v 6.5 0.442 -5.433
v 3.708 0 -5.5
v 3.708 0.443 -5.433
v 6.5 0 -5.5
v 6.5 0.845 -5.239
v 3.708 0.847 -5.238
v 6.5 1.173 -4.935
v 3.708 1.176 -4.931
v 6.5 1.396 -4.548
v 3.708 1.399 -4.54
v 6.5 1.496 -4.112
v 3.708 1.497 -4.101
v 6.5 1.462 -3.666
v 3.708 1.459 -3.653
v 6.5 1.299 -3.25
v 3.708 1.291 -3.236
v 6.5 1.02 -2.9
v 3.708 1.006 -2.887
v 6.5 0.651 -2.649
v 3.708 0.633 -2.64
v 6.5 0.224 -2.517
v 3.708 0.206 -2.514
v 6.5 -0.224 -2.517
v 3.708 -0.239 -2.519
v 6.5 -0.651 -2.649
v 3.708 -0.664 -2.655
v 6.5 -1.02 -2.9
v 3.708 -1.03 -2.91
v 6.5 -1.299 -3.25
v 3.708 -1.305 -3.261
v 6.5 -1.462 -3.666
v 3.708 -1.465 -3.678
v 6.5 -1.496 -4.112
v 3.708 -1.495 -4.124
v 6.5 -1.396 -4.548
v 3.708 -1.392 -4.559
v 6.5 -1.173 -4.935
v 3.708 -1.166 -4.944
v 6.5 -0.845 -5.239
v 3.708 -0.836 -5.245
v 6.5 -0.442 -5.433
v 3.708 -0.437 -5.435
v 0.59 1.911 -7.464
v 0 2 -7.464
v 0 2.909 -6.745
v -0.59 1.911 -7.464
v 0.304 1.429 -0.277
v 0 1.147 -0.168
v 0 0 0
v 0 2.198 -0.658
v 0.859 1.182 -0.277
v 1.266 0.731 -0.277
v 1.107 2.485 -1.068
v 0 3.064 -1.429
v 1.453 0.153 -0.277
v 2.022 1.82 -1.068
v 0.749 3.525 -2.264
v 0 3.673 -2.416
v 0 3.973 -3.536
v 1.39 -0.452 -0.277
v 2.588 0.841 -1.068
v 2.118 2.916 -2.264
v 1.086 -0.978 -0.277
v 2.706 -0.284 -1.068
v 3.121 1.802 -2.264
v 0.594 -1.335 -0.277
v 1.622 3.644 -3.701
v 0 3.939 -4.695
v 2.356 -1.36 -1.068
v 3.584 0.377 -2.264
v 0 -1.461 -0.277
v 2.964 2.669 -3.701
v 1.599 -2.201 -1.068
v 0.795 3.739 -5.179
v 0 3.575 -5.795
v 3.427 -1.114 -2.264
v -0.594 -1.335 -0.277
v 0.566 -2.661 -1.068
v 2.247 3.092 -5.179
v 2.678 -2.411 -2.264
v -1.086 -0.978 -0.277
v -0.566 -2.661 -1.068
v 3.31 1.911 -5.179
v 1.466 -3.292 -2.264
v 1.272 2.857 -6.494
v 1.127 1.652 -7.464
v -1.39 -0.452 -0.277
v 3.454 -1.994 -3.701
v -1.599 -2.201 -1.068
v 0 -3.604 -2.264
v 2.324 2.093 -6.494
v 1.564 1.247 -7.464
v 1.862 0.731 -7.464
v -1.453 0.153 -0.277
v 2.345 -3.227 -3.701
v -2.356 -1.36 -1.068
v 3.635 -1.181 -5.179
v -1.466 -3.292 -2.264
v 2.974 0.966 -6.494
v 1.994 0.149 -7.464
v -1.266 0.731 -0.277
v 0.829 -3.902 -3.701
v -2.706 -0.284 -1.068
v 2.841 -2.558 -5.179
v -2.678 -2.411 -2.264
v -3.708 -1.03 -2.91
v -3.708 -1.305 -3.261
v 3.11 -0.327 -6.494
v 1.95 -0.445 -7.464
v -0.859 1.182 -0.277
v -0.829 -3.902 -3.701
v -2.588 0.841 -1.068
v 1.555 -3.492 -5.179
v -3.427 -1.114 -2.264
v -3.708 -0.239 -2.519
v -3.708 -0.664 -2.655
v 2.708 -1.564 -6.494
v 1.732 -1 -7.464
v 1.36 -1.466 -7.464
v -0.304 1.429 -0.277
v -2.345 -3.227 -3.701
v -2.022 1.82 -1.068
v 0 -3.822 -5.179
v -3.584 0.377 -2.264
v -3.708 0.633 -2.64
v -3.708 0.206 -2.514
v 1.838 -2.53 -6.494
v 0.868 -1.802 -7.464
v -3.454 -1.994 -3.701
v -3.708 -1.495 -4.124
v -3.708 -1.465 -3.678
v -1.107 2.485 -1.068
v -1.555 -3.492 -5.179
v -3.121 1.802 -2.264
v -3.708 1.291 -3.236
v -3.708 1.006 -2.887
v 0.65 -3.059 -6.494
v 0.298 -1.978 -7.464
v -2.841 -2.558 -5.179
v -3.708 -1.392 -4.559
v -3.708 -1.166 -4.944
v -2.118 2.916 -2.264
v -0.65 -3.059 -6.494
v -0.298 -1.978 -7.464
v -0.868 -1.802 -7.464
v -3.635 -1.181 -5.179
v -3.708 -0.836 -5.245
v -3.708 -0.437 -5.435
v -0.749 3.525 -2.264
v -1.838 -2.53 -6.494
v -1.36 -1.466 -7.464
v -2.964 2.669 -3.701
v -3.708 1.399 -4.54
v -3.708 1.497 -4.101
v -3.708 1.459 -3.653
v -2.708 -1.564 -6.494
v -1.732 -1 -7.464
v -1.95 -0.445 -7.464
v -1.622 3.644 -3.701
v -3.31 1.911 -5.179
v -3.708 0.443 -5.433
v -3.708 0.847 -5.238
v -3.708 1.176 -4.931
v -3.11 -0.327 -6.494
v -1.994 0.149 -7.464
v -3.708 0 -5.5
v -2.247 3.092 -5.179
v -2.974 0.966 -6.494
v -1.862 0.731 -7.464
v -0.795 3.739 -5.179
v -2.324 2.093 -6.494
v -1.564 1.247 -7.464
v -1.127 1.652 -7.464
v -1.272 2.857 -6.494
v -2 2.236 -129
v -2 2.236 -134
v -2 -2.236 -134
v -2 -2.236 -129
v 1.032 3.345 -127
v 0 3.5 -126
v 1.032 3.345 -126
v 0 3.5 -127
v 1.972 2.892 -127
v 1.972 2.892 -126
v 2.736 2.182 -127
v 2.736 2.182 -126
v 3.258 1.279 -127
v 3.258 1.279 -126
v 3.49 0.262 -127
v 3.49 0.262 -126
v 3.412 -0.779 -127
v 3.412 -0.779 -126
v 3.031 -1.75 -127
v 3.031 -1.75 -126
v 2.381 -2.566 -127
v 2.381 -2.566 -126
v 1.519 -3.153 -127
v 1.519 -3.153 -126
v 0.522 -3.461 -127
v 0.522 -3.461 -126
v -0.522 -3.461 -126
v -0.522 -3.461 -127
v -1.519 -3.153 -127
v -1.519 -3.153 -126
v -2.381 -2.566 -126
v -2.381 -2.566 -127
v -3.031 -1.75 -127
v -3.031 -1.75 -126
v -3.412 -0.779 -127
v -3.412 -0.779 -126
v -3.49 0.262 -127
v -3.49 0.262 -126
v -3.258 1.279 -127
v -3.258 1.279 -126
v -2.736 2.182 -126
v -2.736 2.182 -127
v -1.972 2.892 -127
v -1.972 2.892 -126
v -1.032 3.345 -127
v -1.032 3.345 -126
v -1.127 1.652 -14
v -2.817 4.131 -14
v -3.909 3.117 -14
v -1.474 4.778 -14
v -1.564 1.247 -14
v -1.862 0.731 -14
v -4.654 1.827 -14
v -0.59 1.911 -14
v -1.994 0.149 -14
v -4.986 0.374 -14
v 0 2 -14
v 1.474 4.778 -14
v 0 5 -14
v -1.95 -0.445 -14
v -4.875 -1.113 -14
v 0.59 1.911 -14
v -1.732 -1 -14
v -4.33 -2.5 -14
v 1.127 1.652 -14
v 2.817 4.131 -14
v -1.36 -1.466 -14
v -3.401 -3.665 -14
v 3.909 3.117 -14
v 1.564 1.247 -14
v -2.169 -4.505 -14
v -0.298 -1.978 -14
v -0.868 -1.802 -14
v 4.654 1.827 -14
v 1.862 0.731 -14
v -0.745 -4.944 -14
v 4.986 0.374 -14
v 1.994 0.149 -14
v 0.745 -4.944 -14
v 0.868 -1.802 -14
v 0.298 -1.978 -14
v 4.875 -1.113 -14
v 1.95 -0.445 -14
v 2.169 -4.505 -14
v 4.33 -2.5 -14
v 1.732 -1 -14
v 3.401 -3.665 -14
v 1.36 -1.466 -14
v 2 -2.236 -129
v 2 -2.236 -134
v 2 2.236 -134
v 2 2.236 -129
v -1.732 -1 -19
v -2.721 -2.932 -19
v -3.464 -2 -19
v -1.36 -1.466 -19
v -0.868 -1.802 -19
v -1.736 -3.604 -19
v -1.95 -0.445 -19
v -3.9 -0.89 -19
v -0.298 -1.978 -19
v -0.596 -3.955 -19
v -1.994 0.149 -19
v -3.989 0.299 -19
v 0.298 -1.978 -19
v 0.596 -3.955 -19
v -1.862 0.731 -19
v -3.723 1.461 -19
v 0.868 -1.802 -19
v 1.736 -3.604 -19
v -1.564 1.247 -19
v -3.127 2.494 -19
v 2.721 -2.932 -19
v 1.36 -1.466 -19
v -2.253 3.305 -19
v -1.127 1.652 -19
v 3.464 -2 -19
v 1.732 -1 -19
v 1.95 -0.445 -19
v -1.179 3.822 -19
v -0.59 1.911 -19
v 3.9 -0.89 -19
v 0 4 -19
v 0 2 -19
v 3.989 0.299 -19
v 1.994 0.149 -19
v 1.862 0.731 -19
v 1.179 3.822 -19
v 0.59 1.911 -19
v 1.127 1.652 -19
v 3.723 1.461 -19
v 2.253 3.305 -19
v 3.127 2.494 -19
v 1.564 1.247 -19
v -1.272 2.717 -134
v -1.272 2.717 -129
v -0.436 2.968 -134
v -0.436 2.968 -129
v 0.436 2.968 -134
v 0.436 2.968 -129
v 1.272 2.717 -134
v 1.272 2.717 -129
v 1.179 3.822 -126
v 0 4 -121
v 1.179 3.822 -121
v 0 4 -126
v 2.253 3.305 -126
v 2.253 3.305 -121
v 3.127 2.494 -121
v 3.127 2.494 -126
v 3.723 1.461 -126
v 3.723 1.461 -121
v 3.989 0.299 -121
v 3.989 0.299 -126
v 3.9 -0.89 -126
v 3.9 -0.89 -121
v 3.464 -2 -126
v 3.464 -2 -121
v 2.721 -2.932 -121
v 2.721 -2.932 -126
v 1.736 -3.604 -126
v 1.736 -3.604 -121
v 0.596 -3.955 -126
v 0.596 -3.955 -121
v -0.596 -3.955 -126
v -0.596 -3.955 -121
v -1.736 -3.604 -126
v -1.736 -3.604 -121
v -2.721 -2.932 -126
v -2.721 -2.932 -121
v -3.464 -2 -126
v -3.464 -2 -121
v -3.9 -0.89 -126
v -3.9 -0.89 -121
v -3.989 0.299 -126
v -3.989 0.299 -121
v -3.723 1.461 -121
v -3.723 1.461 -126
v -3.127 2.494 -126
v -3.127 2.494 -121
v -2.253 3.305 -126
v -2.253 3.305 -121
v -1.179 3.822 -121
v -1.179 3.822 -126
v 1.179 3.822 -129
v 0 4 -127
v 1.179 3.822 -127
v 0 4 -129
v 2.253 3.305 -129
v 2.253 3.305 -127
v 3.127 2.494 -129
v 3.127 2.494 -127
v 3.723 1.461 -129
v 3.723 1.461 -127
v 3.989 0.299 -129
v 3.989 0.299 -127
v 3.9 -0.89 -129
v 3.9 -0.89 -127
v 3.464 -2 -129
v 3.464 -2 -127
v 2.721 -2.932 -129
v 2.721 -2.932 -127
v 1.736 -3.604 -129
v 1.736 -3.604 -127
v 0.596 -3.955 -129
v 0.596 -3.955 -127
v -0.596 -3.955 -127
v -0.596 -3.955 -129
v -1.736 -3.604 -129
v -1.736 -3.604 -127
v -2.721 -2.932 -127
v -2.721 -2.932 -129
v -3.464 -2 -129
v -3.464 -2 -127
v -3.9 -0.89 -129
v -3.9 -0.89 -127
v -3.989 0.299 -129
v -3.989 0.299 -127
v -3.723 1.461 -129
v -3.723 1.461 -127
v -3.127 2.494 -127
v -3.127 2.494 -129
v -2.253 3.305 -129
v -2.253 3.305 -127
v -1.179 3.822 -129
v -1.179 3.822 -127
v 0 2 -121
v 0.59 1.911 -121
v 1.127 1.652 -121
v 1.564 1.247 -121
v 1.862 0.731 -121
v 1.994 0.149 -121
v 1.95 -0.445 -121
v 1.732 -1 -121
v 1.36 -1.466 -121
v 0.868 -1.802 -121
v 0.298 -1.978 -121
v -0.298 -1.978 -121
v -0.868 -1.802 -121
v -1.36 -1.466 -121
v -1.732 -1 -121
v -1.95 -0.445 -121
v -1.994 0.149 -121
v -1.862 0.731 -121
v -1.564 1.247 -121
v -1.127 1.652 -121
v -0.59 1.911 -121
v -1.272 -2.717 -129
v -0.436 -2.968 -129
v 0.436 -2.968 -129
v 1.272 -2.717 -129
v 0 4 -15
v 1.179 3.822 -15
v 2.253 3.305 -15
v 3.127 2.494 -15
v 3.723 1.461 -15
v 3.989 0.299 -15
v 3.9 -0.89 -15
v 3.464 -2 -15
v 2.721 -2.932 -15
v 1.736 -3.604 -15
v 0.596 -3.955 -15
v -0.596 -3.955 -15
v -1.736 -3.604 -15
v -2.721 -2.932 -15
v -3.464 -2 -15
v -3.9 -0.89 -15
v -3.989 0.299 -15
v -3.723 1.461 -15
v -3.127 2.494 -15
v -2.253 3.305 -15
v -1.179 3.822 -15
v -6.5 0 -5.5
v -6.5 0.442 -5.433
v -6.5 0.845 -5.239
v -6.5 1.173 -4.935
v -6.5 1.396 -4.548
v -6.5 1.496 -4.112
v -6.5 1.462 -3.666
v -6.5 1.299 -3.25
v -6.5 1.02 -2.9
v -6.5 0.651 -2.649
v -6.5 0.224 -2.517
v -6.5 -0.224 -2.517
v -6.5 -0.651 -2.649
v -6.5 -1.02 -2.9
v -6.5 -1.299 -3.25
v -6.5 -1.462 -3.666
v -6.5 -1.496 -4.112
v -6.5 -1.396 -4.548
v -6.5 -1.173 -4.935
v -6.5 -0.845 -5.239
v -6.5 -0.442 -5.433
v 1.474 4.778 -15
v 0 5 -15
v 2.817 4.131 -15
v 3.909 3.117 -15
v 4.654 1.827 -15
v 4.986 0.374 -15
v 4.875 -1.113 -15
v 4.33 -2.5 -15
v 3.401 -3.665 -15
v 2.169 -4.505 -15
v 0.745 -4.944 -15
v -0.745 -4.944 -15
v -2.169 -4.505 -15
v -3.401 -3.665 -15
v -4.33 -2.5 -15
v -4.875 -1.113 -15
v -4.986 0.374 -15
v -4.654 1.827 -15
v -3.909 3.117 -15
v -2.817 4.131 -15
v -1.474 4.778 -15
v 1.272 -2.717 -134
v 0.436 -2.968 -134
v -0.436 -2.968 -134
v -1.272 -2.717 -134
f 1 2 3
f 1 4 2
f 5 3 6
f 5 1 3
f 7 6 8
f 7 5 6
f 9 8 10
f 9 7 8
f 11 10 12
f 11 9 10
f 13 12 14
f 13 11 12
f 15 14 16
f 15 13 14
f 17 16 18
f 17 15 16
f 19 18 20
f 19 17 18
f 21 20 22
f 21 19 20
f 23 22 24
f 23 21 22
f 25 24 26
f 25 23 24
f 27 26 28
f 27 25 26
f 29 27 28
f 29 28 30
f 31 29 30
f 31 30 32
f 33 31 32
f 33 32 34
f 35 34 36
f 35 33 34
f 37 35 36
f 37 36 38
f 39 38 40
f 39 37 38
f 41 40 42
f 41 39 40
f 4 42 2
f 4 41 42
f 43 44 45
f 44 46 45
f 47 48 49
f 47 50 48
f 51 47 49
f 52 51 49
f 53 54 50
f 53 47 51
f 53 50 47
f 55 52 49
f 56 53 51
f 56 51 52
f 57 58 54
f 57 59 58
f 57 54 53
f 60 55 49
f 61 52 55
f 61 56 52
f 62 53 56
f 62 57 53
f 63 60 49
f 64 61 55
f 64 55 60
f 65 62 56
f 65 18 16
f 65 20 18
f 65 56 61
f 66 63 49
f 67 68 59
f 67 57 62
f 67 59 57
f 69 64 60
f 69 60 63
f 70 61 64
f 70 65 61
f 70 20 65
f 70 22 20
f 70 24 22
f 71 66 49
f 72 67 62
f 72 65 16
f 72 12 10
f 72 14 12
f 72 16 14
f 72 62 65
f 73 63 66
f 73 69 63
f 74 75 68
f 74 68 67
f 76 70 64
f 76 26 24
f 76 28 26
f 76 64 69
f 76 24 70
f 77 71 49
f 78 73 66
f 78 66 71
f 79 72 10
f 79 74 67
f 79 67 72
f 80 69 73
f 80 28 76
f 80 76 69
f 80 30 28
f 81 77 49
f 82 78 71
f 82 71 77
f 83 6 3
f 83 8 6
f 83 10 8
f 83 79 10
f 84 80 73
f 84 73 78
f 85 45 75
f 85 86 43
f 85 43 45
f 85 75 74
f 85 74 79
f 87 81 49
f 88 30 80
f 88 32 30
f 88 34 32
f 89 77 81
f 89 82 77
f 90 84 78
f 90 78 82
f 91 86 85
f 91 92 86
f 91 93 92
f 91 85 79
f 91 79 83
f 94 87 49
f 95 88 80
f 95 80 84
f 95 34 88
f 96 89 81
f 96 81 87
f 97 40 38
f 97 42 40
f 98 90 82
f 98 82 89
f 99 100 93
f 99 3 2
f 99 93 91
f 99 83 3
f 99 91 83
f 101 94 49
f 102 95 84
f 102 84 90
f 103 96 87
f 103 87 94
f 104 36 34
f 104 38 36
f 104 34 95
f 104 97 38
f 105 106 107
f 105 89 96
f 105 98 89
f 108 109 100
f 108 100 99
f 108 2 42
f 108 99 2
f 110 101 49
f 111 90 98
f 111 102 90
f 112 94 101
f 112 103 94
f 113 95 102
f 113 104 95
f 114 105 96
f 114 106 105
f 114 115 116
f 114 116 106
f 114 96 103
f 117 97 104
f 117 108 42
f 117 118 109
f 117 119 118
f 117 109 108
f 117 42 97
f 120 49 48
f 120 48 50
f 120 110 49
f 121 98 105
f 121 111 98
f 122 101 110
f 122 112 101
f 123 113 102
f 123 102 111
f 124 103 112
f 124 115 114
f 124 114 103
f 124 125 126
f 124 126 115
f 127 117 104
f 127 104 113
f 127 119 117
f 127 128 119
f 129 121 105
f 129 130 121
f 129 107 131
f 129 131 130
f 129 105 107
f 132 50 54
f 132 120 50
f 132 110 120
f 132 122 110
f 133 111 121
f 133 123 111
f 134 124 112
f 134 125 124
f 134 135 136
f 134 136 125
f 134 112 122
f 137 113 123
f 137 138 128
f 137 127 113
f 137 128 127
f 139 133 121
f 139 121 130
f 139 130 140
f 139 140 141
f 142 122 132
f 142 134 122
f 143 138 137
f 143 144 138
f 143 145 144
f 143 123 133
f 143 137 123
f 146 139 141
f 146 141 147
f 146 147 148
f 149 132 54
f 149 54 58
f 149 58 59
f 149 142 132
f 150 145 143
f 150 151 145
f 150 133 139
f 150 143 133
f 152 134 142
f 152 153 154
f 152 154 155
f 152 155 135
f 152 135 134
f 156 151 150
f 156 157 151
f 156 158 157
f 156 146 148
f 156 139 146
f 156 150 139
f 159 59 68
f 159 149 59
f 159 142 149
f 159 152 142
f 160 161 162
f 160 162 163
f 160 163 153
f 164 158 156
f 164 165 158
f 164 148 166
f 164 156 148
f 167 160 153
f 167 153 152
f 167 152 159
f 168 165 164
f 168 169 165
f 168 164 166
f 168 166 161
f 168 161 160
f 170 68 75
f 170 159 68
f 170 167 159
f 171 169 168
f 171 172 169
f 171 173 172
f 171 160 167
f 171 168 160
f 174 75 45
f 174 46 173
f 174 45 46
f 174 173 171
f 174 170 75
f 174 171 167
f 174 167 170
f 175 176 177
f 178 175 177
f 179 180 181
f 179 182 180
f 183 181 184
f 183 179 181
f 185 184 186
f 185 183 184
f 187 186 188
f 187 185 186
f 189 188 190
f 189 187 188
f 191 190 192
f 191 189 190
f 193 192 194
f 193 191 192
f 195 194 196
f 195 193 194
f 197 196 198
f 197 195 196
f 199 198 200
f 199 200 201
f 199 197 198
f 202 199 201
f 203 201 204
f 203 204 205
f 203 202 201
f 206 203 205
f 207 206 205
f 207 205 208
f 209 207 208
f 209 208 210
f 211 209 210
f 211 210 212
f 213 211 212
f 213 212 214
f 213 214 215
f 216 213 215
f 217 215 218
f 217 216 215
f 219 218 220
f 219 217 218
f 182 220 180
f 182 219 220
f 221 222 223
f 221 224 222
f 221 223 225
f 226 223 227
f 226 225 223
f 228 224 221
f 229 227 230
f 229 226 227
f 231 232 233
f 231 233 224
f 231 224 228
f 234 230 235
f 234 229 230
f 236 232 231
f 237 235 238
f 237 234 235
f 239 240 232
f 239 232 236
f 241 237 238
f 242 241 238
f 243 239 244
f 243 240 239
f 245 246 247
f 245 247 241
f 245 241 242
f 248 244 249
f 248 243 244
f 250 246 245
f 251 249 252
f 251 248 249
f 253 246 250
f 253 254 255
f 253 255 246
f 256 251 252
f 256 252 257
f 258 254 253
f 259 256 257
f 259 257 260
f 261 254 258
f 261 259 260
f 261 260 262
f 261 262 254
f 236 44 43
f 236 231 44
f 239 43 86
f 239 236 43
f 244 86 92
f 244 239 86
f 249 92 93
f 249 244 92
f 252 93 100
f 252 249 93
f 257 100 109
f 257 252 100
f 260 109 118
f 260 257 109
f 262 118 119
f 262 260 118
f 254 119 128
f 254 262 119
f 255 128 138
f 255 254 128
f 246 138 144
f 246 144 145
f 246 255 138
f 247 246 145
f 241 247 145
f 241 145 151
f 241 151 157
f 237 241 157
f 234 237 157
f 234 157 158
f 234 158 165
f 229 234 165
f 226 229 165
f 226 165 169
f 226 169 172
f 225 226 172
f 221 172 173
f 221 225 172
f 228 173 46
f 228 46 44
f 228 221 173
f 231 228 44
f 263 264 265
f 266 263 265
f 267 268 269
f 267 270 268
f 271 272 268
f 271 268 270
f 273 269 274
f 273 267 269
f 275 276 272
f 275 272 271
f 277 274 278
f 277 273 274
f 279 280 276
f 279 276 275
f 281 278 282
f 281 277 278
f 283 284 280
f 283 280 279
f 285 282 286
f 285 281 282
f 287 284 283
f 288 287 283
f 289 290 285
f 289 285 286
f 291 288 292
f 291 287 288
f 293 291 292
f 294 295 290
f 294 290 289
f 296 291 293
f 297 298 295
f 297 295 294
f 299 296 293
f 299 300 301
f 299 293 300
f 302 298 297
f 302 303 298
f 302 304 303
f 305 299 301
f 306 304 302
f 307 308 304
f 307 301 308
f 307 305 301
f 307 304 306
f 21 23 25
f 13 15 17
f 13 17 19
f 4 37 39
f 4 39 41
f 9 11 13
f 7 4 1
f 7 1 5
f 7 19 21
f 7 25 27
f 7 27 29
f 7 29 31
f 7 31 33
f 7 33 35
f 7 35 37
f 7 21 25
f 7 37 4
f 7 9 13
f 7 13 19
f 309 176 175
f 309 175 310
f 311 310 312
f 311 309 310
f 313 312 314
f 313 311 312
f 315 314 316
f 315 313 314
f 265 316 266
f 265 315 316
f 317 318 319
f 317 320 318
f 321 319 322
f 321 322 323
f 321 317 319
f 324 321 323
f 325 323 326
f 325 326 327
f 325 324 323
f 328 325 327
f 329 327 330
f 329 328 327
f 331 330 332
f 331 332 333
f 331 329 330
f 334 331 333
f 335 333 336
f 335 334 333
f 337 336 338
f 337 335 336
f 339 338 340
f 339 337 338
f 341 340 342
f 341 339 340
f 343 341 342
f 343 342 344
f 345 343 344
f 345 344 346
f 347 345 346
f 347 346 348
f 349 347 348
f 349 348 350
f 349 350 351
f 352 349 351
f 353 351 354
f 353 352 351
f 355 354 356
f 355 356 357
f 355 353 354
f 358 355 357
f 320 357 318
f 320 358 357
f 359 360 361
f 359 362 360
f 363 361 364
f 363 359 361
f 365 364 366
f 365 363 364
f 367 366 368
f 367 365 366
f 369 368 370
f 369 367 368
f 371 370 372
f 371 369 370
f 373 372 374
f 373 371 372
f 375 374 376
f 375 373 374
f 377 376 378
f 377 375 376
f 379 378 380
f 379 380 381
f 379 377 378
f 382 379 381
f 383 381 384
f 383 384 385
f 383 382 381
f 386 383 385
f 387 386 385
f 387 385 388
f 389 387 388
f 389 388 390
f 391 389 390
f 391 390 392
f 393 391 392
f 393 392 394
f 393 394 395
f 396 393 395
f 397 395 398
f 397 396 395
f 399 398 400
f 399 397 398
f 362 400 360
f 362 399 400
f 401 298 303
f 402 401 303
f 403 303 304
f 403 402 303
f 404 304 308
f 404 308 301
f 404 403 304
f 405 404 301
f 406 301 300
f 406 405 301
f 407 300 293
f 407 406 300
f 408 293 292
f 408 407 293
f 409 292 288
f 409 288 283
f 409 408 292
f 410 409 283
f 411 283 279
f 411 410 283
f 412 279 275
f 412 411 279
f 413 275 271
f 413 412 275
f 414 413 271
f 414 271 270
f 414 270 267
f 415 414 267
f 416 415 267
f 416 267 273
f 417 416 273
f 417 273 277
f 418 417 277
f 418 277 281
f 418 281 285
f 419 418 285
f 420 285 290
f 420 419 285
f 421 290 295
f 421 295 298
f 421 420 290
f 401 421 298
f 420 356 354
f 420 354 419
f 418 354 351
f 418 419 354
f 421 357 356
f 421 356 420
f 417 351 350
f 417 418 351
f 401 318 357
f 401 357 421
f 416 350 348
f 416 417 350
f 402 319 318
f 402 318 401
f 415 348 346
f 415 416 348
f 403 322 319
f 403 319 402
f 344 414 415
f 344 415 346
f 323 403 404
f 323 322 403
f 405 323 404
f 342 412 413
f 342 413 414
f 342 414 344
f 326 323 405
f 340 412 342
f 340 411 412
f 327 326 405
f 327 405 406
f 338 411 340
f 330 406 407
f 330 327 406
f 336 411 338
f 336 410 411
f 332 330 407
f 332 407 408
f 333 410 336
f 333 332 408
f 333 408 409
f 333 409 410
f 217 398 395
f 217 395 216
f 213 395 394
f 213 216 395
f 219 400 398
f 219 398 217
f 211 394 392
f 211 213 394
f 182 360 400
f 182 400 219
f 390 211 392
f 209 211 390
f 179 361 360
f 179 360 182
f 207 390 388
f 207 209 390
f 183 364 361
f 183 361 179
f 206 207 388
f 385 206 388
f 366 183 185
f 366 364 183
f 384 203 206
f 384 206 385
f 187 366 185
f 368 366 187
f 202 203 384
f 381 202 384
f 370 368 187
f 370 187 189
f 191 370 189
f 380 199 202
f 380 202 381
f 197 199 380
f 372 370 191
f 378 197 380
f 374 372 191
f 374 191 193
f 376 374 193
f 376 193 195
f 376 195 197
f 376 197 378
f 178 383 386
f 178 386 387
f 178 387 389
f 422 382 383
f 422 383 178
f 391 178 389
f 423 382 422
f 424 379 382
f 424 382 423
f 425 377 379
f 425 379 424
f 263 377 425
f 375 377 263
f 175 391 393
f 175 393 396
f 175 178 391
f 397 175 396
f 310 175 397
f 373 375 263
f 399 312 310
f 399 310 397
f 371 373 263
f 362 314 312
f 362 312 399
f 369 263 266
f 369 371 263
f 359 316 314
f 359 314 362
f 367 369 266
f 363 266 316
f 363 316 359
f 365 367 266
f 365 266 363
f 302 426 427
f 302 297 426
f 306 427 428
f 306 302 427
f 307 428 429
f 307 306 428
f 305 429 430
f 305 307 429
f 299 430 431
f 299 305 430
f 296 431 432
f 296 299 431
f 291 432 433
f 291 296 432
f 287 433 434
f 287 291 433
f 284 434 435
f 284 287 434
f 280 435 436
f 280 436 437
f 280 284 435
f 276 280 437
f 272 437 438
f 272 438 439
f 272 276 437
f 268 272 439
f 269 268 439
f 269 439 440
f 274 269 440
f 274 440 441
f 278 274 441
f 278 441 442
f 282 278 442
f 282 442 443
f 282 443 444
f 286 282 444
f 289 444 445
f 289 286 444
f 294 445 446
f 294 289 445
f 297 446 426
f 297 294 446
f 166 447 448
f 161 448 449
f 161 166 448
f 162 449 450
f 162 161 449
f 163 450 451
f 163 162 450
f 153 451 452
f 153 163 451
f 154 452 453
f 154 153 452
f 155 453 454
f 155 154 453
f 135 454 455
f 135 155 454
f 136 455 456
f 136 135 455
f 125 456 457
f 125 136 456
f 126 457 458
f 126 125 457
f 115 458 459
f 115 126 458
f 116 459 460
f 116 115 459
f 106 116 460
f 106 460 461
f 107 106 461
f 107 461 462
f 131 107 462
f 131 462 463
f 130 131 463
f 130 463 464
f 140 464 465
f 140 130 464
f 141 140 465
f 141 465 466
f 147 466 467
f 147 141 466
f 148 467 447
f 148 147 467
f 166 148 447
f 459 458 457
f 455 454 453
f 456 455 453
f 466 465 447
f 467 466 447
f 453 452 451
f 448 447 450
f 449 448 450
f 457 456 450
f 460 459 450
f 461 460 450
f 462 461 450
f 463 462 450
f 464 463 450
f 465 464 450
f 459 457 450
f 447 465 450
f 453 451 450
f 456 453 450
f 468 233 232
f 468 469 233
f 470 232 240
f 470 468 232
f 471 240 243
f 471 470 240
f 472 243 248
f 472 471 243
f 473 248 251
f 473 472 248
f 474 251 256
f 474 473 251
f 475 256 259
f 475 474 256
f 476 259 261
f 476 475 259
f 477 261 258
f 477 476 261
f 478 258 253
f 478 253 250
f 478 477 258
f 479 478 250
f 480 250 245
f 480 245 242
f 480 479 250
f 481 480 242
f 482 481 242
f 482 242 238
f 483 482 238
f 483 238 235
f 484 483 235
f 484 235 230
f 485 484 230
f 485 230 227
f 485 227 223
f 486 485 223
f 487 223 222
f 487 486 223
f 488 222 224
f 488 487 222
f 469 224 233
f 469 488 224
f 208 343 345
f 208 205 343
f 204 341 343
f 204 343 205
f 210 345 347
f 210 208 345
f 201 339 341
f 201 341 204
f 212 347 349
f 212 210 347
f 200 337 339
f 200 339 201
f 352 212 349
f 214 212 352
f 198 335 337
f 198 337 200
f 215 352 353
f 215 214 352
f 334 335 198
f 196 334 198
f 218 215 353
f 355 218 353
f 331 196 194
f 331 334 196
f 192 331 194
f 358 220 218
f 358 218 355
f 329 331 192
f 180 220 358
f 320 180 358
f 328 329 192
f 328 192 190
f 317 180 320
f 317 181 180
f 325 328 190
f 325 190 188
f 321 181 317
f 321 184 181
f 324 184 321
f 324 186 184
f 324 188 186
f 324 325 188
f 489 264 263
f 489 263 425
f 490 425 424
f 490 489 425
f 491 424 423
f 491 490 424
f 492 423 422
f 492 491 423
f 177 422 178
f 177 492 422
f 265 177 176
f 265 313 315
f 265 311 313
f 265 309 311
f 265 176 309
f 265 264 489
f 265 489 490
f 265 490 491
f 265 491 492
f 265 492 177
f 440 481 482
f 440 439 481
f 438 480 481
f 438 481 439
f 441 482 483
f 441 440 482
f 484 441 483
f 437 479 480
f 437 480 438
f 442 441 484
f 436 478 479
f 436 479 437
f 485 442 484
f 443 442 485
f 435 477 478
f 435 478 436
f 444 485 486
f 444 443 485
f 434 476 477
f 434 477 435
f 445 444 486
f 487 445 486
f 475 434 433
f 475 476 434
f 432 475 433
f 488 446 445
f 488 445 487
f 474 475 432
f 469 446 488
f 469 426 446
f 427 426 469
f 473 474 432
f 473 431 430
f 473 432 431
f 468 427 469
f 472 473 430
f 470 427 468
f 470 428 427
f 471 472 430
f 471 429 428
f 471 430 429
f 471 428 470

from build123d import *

# Parameters (mm, degrees)
CUT_EXTRUDE1_DEPTH  = 5
SKETCH3_R           = 1.5
BOSS_EXTRUDE1_DEPTH = 6.5


with BuildPart() as part:
    # Sketch1 → Revolve1 (revolve)
    with BuildSketch(Plane(origin=(0, 0, 0), x_dir=(0, 0, -1), z_dir=(1, 0, 0))):
        with BuildLine():
            Line((7.464101615, 2), (14, 2))
            Line((14, 2), (14, 5))
            Line((14, 5), (15, 5))
            Line((15, 5), (15, 4))
            Line((15, 4), (19, 4))
            Line((19, 4), (19, 2))
            Line((19, 2), (121, 2))
            Line((121, 2), (121, 4))
            Line((121, 4), (126, 4))
            Line((126, 4), (126, 3.5))
            Line((126, 3.5), (127, 3.5))
            Line((127, 3.5), (127, 4))
            Line((127, 4), (129, 4))
            Line((129, 4), (129, 3))
            Line((129, 3), (134, 3))
            Line((134, 3), (134, 0))
            Line((134, 0), (0, 0))
            ThreePointArc((0, 0), (2.96472382, 3.863703305), (7.464101615, 2))
        make_face()
    revolve(axis=Axis((0, 0, 0), (0, 0, -1)))

    # Sketch2 → Cut-Extrude1 (cut)
    with BuildSketch(Plane(origin=(0, 0, -134), x_dir=(-1, 0, 0), z_dir=(0, 0, -1))):
        with BuildLine():
            ThreePointArc((-2, 2.236067977), (-3, 0), (-2, -2.236067977))
            Line((-2, -2.236067977), (-2, 2.236067977))
        make_face()
        with BuildLine():
            Line((2, 2.236067977), (2, -2.236067977))
            ThreePointArc((2, -2.236067977), (2.738612788, -1.224744871), (3, 0))
            ThreePointArc((3, 0), (2.738612788, 1.224744871), (2, 2.236067977))
        make_face()
    extrude(amount=-CUT_EXTRUDE1_DEPTH, mode=Mode.SUBTRACT)

    # Sketch3 → Boss-Extrude1 (add, symmetric)
    with BuildSketch(Plane(origin=(0, 0, 0), x_dir=(0, 0, -1), z_dir=(1, 0, 0))):
        with Locations((4, 0)):
            Circle(SKETCH3_R)
    extrude(amount=BOSS_EXTRUDE1_DEPTH, both=True)


solid = part.part
